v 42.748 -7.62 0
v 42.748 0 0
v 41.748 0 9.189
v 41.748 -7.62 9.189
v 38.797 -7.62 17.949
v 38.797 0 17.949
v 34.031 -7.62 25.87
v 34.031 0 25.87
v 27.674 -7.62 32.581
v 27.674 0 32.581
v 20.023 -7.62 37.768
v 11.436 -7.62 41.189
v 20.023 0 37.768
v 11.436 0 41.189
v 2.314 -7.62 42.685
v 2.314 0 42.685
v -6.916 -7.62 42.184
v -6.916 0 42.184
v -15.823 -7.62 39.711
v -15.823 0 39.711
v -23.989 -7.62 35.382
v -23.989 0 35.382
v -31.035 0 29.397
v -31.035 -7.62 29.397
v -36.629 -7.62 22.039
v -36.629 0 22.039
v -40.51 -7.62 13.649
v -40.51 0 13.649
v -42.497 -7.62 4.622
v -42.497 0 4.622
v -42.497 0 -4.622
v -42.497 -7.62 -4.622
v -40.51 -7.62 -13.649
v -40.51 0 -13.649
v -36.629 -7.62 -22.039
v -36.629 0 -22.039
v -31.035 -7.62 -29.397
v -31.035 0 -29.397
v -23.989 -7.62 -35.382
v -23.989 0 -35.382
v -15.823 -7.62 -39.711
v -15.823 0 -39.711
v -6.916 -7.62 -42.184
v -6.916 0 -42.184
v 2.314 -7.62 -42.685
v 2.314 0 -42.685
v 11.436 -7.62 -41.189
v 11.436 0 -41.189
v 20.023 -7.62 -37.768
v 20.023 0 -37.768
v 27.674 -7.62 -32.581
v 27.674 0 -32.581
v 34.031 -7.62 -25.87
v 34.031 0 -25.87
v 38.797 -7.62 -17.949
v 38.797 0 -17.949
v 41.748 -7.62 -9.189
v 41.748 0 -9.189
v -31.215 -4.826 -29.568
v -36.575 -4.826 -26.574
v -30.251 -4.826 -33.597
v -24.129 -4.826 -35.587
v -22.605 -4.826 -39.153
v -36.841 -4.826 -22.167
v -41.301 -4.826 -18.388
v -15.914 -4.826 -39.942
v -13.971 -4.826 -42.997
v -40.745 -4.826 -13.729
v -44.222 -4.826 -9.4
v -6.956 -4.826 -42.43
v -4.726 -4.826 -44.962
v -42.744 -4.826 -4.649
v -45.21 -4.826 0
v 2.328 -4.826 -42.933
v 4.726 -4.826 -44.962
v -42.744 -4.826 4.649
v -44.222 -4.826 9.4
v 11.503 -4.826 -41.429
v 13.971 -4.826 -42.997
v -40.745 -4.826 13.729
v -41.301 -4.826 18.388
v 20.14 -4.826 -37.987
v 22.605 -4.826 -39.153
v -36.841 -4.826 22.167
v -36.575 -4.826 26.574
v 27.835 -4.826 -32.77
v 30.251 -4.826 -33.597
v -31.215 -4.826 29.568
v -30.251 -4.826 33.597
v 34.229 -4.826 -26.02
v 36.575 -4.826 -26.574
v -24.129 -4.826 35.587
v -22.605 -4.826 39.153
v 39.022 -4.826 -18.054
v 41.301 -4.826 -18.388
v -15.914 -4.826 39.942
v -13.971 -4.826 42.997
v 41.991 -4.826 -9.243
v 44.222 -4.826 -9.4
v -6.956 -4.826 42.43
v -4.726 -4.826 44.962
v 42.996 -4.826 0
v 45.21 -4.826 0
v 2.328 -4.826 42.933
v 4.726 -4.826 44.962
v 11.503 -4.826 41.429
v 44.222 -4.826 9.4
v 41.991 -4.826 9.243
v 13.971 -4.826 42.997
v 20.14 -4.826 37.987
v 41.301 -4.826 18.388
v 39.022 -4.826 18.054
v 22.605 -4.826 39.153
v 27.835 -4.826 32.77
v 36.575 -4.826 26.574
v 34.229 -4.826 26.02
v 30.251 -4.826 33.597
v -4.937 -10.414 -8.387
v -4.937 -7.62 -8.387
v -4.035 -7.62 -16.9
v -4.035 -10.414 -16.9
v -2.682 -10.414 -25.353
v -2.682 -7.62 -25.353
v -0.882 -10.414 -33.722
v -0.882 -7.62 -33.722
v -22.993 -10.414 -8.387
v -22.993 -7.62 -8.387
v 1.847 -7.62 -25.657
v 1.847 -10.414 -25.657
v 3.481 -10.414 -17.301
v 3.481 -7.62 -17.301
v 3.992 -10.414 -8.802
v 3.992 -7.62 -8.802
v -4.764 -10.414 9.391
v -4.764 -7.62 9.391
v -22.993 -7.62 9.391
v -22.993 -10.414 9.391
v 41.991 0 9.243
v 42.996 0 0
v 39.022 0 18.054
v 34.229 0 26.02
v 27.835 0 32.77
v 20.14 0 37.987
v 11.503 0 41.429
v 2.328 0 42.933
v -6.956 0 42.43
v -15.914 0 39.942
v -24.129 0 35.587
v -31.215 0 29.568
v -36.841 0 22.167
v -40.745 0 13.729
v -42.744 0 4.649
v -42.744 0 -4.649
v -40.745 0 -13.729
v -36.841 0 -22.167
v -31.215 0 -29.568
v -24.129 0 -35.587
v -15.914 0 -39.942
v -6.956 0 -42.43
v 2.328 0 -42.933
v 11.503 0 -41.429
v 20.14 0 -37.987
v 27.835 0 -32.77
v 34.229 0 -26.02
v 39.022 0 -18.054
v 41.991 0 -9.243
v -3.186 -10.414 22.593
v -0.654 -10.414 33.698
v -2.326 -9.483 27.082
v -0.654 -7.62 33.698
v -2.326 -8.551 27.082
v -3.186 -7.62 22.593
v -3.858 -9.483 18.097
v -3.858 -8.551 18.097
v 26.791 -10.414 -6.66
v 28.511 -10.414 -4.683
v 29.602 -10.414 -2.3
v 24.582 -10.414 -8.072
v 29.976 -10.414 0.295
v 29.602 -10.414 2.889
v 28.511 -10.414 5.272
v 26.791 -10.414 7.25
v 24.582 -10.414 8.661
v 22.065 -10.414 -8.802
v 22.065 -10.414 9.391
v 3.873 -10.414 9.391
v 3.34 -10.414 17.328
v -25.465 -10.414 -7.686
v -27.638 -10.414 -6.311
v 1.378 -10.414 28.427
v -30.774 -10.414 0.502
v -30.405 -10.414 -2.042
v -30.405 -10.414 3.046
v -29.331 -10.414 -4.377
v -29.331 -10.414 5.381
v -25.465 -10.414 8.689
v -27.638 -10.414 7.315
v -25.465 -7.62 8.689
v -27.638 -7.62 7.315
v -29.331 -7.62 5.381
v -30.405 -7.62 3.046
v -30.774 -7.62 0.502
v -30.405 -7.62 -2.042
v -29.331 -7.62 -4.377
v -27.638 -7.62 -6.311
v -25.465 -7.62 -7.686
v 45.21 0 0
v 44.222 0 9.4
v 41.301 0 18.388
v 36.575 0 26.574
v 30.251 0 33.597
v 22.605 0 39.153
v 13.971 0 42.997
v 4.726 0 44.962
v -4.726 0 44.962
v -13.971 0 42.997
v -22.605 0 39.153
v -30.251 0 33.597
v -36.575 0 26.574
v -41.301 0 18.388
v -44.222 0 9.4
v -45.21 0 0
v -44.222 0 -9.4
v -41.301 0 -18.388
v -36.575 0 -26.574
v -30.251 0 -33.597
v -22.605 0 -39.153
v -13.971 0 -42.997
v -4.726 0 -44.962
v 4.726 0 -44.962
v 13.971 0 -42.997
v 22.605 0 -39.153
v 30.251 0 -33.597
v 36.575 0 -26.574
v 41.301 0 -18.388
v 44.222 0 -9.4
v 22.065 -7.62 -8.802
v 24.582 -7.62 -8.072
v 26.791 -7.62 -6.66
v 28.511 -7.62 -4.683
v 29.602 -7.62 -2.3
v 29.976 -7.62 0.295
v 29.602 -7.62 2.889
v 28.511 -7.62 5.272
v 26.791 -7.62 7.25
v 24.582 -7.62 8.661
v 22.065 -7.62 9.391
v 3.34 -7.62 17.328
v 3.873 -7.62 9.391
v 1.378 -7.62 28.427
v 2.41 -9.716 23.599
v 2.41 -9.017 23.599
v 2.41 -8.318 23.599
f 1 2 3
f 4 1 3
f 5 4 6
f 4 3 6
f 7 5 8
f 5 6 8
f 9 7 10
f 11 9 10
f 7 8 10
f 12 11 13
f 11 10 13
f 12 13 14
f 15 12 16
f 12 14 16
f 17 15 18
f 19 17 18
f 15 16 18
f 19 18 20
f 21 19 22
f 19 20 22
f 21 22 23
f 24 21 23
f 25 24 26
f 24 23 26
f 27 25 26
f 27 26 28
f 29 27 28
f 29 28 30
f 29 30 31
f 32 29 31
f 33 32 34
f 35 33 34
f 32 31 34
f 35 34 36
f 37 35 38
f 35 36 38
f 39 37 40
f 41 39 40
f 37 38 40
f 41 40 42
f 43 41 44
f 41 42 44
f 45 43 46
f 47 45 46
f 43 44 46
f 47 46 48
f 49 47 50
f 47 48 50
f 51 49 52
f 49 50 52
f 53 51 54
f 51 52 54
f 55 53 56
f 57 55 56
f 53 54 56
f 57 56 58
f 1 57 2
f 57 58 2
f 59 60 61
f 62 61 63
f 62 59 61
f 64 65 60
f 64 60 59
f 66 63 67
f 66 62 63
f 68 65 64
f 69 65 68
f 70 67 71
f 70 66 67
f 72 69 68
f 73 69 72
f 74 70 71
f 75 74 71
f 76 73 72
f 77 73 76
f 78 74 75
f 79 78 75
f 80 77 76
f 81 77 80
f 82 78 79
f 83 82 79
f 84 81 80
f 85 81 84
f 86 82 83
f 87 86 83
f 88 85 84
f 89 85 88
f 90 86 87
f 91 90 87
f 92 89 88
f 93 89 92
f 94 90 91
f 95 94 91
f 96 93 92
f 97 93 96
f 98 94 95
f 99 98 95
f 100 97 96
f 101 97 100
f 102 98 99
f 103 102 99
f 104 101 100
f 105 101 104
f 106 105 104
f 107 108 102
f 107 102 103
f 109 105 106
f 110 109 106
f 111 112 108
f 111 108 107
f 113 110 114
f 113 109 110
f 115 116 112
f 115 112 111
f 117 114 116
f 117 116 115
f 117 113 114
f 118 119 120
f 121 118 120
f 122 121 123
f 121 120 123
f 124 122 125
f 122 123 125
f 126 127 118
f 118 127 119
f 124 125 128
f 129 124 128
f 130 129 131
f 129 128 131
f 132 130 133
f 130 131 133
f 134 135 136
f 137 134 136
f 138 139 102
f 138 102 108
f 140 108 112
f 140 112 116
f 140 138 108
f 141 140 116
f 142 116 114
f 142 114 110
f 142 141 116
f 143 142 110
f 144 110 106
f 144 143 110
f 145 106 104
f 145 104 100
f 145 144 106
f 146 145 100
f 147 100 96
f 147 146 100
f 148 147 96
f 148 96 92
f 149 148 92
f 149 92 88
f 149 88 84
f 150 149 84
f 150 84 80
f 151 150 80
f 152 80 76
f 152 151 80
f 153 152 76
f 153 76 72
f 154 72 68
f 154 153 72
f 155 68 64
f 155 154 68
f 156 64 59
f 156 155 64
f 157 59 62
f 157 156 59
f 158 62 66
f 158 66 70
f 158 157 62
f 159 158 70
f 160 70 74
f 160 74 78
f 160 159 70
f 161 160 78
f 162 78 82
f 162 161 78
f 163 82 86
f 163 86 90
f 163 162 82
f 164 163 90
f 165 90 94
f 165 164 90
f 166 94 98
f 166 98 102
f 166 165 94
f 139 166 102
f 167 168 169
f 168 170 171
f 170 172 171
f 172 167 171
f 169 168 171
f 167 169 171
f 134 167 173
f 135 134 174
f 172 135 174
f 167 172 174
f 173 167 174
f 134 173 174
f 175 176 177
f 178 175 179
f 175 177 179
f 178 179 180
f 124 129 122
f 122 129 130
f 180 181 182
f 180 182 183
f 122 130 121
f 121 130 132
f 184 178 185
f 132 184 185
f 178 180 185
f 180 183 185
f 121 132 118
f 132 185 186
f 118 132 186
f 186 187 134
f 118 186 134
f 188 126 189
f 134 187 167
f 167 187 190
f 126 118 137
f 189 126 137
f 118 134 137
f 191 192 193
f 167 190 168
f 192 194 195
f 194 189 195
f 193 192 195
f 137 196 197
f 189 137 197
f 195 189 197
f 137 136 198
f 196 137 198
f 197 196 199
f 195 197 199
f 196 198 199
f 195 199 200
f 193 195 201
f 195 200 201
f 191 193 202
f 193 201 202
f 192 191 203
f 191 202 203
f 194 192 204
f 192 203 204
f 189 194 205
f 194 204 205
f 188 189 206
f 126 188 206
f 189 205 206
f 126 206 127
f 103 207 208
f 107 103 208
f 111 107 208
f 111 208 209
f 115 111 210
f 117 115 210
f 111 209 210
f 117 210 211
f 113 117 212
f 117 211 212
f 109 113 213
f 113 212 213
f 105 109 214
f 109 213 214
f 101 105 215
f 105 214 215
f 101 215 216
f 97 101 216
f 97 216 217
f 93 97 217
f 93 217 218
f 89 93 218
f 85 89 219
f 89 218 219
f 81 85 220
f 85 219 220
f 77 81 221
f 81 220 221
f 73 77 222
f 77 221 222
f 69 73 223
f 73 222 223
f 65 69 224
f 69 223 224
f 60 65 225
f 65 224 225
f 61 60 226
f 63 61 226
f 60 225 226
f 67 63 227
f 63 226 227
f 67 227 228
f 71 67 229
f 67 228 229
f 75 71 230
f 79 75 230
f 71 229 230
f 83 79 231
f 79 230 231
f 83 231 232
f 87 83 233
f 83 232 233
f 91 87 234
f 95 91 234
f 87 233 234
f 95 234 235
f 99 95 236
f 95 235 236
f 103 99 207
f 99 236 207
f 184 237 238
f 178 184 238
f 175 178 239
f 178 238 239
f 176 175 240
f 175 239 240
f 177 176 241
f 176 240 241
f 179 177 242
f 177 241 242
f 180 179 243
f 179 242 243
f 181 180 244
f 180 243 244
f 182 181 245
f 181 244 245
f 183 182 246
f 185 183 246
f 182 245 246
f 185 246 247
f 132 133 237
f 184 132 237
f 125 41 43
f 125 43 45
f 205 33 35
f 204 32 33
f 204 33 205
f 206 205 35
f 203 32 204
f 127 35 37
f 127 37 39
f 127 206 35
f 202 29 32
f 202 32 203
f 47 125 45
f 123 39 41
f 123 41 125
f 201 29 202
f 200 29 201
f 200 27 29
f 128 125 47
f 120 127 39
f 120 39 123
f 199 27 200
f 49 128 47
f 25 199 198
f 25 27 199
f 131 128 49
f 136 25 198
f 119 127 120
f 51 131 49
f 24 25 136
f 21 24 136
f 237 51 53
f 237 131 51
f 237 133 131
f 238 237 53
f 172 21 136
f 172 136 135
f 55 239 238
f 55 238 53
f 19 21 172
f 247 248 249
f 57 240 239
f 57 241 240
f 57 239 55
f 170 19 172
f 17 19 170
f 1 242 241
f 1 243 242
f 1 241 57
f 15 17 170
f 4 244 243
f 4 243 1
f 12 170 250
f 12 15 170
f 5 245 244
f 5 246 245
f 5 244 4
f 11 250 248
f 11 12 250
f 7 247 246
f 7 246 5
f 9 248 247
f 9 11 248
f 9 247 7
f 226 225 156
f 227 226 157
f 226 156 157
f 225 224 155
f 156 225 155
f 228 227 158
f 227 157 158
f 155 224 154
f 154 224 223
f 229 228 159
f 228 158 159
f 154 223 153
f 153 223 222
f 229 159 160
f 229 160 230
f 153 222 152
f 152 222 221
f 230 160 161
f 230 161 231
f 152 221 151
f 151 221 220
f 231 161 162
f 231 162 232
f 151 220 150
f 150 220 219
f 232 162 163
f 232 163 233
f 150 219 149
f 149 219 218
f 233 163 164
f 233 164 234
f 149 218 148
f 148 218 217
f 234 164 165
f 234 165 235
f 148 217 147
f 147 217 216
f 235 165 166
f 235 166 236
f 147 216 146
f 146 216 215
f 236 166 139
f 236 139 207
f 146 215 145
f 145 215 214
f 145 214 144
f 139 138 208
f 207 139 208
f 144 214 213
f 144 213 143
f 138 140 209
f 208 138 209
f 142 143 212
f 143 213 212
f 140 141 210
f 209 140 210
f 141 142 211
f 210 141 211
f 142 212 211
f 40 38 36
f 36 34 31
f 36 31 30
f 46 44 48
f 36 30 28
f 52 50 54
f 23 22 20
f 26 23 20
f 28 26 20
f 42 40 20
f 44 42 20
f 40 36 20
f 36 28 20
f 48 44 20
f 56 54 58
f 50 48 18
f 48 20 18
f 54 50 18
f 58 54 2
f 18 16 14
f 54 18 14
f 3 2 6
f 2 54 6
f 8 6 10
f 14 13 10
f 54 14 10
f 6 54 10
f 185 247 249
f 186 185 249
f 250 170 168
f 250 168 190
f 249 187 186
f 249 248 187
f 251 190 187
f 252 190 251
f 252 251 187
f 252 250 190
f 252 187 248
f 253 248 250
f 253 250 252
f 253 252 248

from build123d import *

# Parameters (mm, degrees)
F0_R     = 45.2096940333
F0_R_2   = 42.9959145062
F1_DEPTH = 4.826
F2_R     = 42.7475705769
F3_DEPTH = 7.62
F5_DEPTH = 2.794


with BuildPart() as f1:
    # F0 (on Front) → F1 (new body)
    with BuildSketch(Plane.XZ):
        Circle(F0_R)
        Circle(F0_R_2, mode=Mode.SUBTRACT)
    extrude(amount=F1_DEPTH)


with BuildPart() as f3:
    # F2 (on Front) → F3 (new body)
    with BuildSketch(Plane.XZ):
        Circle(F2_R)
    extrude(amount=F3_DEPTH)

    # F4 (on face) → F5 (join)
    with BuildSketch(Plane.XZ.offset(7.62)):
        with BuildLine():
            add(Edge.make_bspline(
                [(-0.6543919444, 33.698104322), (-0.2590268137, 32.9683653971), (0.8003411255, 31.0130538107), (2.6219964959, 23.619319648), (3.9236973733, 12.8800810427), (3.88602667, 10.3007600876), (3.8727382198, 9.3908971176)],
                knots=[0, 0, 0, 0, 0.1736123025, 0.4651884874, 0.8113436832, 1, 1, 1, 1], degree=3))
            add(Edge.make_bspline(
                [(-0.6543919444, 33.698104322), (-1.2292204105, 31.5904283328), (-2.4683528149, 27.0470040412), (-3.9833158516, 18.0359036672), (-4.5052875268, 12.2530715191), (-4.7636339441, 9.3908971176)],
                knots=[0, 0, 0, 0, 0.3041204354, 0.6555790268, 1, 1, 1, 1], degree=3))
            Line((-4.7636339441, 9.3908971176), (-22.9926649481, 9.3908971176))
            ThreePointArc((-22.9926649481, 9.3908971176), (-30.7737027326, 0.5017137155), (-22.9926649481, -8.3874696866))
            Line((-22.9926649481, -8.3874696866), (-4.9365786836, -8.3874696866))
            ThreePointArc((-4.9365786836, -8.3874696866), (-3.4143222248, -21.1358112445), (-0.8819333743, -33.7224900723))
            ThreePointArc((-0.8819333743, -33.7224900723), (2.8026793905, -21.5060781732), (3.9915125817, -8.8015999645))
            Line((3.9915125817, -8.8015999645), (22.0647267997, -8.8015999645))
            ThreePointArc((22.0647267997, -8.8015999645), (29.9763005809, 0.2946485765), (22.0647267997, 9.3908971176))
            Line((22.0647267997, 9.3908971176), (3.8727382198, 9.3908971176))
        make_face()
    extrude(amount=F5_DEPTH)


solid = Compound([f1.part, f3.part])
